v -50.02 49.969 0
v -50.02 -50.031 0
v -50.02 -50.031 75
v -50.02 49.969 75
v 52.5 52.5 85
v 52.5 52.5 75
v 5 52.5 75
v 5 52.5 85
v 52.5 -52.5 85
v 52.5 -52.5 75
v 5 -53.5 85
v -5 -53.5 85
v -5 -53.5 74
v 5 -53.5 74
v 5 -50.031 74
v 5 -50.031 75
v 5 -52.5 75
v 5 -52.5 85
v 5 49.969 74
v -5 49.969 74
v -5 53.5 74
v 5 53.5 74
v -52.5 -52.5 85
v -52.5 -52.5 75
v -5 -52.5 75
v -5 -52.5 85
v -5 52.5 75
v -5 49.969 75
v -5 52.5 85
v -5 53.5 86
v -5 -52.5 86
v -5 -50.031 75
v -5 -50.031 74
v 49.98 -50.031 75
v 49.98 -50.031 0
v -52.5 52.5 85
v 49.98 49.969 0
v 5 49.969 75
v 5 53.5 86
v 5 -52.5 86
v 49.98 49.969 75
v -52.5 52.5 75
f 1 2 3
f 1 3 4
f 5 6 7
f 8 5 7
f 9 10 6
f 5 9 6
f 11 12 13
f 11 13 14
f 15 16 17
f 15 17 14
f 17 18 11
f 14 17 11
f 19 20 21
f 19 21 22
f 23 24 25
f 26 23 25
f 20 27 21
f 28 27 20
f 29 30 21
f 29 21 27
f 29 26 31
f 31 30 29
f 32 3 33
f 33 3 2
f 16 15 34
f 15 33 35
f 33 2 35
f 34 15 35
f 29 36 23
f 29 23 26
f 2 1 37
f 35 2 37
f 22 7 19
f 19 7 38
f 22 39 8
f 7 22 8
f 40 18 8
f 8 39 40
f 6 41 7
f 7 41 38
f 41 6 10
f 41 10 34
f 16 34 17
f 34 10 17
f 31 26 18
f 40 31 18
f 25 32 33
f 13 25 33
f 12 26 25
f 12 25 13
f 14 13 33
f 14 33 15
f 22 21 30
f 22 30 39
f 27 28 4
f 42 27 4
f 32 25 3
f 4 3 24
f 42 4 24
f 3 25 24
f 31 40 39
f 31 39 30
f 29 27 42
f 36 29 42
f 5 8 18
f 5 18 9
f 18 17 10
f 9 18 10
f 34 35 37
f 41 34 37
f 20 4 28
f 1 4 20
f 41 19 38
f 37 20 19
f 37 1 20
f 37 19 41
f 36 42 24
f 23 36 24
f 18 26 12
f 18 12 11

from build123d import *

# Parameters (mm, degrees)
F0_W      = 100
F0_H      = 100
F1_DEPTH  = 75
F2_W      = 52.5
F2_H      = 52.5
F3_DEPTH  = 10
F4_W      = 5
F4_H      = 52.5
F5_DEPTH  = 1
F6_W      = 10
F6_H      = 10
F7_DEPTH  = 1
F8_W      = 10
F8_H      = 11
F9_DEPTH  = 1
F10_W     = 10
F10_H     = 3.468894
F11_DEPTH = 1
F12_W     = 10
F12_H     = 3.531106
F13_DEPTH = 1


with BuildPart() as f1:
    # F0 (on Top) → F1 (new body)
    with BuildSketch(Plane.XY):
        with Locations((-0.019781, -0.031106)):
            Rectangle(F0_W, F0_H)
    extrude(amount=F1_DEPTH)

    # F2 (on face) → F3 (join)
    with BuildSketch(Plane.XY.offset(75)):
        with Locations((26.25, 26.25)):
            Rectangle(F2_W, F2_H)
        with Locations((-26.25, 26.25)):
            Rectangle(F2_W, F2_H)
        with Locations((26.25, -26.25)):
            Rectangle(F2_W, F2_H)
        with Locations((-26.25, -26.25)):
            Rectangle(F2_W, F2_H)
    extrude(amount=F3_DEPTH)

    # F4 (on face) → F5 (join)
    with BuildSketch(Plane.XY.offset(85)):
        with Locations((-2.5, -26.25)):
            Rectangle(F4_W, F4_H)
        with Locations((-2.5, 26.25)):
            Rectangle(F4_W, F4_H)
        with Locations((2.5, -26.25)):
            Rectangle(F4_W, F4_H)
        with Locations((2.5, 26.25)):
            Rectangle(F4_W, F4_H)
    extrude(amount=F5_DEPTH)

    # F6 (on face) → F7 (join)
    with BuildSketch(Plane.XZ.offset(52.5)):
        with Locations((0, 80)):
            Rectangle(F6_W, F6_H)
    extrude(amount=F7_DEPTH)

    # F8 (on face) → F9 (join)
    with BuildSketch(Plane(origin=(0, 52.5, 0), x_dir=(-1, 0, 0), z_dir=(0, 1, 0))):
        with Locations((0, 80.5)):
            Rectangle(F8_W, F8_H)
    extrude(amount=F9_DEPTH)

    # F10 (on face) → F11 (join)
    with BuildSketch(Plane(origin=(0, 0, 75), x_dir=(1, 0, 0), z_dir=(0, 0, -1))):
        with Locations((0, 51.765553)):
            Rectangle(F10_W, F10_H)
    extrude(amount=F11_DEPTH)

    # F12 (on face) → F13 (join)
    with BuildSketch(Plane(origin=(0, 0, 75), x_dir=(1, 0, 0), z_dir=(0, 0, -1))):
        with Locations((0, -51.734447)):
            Rectangle(F12_W, F12_H)
    extrude(amount=F13_DEPTH)


solid = f1.part
